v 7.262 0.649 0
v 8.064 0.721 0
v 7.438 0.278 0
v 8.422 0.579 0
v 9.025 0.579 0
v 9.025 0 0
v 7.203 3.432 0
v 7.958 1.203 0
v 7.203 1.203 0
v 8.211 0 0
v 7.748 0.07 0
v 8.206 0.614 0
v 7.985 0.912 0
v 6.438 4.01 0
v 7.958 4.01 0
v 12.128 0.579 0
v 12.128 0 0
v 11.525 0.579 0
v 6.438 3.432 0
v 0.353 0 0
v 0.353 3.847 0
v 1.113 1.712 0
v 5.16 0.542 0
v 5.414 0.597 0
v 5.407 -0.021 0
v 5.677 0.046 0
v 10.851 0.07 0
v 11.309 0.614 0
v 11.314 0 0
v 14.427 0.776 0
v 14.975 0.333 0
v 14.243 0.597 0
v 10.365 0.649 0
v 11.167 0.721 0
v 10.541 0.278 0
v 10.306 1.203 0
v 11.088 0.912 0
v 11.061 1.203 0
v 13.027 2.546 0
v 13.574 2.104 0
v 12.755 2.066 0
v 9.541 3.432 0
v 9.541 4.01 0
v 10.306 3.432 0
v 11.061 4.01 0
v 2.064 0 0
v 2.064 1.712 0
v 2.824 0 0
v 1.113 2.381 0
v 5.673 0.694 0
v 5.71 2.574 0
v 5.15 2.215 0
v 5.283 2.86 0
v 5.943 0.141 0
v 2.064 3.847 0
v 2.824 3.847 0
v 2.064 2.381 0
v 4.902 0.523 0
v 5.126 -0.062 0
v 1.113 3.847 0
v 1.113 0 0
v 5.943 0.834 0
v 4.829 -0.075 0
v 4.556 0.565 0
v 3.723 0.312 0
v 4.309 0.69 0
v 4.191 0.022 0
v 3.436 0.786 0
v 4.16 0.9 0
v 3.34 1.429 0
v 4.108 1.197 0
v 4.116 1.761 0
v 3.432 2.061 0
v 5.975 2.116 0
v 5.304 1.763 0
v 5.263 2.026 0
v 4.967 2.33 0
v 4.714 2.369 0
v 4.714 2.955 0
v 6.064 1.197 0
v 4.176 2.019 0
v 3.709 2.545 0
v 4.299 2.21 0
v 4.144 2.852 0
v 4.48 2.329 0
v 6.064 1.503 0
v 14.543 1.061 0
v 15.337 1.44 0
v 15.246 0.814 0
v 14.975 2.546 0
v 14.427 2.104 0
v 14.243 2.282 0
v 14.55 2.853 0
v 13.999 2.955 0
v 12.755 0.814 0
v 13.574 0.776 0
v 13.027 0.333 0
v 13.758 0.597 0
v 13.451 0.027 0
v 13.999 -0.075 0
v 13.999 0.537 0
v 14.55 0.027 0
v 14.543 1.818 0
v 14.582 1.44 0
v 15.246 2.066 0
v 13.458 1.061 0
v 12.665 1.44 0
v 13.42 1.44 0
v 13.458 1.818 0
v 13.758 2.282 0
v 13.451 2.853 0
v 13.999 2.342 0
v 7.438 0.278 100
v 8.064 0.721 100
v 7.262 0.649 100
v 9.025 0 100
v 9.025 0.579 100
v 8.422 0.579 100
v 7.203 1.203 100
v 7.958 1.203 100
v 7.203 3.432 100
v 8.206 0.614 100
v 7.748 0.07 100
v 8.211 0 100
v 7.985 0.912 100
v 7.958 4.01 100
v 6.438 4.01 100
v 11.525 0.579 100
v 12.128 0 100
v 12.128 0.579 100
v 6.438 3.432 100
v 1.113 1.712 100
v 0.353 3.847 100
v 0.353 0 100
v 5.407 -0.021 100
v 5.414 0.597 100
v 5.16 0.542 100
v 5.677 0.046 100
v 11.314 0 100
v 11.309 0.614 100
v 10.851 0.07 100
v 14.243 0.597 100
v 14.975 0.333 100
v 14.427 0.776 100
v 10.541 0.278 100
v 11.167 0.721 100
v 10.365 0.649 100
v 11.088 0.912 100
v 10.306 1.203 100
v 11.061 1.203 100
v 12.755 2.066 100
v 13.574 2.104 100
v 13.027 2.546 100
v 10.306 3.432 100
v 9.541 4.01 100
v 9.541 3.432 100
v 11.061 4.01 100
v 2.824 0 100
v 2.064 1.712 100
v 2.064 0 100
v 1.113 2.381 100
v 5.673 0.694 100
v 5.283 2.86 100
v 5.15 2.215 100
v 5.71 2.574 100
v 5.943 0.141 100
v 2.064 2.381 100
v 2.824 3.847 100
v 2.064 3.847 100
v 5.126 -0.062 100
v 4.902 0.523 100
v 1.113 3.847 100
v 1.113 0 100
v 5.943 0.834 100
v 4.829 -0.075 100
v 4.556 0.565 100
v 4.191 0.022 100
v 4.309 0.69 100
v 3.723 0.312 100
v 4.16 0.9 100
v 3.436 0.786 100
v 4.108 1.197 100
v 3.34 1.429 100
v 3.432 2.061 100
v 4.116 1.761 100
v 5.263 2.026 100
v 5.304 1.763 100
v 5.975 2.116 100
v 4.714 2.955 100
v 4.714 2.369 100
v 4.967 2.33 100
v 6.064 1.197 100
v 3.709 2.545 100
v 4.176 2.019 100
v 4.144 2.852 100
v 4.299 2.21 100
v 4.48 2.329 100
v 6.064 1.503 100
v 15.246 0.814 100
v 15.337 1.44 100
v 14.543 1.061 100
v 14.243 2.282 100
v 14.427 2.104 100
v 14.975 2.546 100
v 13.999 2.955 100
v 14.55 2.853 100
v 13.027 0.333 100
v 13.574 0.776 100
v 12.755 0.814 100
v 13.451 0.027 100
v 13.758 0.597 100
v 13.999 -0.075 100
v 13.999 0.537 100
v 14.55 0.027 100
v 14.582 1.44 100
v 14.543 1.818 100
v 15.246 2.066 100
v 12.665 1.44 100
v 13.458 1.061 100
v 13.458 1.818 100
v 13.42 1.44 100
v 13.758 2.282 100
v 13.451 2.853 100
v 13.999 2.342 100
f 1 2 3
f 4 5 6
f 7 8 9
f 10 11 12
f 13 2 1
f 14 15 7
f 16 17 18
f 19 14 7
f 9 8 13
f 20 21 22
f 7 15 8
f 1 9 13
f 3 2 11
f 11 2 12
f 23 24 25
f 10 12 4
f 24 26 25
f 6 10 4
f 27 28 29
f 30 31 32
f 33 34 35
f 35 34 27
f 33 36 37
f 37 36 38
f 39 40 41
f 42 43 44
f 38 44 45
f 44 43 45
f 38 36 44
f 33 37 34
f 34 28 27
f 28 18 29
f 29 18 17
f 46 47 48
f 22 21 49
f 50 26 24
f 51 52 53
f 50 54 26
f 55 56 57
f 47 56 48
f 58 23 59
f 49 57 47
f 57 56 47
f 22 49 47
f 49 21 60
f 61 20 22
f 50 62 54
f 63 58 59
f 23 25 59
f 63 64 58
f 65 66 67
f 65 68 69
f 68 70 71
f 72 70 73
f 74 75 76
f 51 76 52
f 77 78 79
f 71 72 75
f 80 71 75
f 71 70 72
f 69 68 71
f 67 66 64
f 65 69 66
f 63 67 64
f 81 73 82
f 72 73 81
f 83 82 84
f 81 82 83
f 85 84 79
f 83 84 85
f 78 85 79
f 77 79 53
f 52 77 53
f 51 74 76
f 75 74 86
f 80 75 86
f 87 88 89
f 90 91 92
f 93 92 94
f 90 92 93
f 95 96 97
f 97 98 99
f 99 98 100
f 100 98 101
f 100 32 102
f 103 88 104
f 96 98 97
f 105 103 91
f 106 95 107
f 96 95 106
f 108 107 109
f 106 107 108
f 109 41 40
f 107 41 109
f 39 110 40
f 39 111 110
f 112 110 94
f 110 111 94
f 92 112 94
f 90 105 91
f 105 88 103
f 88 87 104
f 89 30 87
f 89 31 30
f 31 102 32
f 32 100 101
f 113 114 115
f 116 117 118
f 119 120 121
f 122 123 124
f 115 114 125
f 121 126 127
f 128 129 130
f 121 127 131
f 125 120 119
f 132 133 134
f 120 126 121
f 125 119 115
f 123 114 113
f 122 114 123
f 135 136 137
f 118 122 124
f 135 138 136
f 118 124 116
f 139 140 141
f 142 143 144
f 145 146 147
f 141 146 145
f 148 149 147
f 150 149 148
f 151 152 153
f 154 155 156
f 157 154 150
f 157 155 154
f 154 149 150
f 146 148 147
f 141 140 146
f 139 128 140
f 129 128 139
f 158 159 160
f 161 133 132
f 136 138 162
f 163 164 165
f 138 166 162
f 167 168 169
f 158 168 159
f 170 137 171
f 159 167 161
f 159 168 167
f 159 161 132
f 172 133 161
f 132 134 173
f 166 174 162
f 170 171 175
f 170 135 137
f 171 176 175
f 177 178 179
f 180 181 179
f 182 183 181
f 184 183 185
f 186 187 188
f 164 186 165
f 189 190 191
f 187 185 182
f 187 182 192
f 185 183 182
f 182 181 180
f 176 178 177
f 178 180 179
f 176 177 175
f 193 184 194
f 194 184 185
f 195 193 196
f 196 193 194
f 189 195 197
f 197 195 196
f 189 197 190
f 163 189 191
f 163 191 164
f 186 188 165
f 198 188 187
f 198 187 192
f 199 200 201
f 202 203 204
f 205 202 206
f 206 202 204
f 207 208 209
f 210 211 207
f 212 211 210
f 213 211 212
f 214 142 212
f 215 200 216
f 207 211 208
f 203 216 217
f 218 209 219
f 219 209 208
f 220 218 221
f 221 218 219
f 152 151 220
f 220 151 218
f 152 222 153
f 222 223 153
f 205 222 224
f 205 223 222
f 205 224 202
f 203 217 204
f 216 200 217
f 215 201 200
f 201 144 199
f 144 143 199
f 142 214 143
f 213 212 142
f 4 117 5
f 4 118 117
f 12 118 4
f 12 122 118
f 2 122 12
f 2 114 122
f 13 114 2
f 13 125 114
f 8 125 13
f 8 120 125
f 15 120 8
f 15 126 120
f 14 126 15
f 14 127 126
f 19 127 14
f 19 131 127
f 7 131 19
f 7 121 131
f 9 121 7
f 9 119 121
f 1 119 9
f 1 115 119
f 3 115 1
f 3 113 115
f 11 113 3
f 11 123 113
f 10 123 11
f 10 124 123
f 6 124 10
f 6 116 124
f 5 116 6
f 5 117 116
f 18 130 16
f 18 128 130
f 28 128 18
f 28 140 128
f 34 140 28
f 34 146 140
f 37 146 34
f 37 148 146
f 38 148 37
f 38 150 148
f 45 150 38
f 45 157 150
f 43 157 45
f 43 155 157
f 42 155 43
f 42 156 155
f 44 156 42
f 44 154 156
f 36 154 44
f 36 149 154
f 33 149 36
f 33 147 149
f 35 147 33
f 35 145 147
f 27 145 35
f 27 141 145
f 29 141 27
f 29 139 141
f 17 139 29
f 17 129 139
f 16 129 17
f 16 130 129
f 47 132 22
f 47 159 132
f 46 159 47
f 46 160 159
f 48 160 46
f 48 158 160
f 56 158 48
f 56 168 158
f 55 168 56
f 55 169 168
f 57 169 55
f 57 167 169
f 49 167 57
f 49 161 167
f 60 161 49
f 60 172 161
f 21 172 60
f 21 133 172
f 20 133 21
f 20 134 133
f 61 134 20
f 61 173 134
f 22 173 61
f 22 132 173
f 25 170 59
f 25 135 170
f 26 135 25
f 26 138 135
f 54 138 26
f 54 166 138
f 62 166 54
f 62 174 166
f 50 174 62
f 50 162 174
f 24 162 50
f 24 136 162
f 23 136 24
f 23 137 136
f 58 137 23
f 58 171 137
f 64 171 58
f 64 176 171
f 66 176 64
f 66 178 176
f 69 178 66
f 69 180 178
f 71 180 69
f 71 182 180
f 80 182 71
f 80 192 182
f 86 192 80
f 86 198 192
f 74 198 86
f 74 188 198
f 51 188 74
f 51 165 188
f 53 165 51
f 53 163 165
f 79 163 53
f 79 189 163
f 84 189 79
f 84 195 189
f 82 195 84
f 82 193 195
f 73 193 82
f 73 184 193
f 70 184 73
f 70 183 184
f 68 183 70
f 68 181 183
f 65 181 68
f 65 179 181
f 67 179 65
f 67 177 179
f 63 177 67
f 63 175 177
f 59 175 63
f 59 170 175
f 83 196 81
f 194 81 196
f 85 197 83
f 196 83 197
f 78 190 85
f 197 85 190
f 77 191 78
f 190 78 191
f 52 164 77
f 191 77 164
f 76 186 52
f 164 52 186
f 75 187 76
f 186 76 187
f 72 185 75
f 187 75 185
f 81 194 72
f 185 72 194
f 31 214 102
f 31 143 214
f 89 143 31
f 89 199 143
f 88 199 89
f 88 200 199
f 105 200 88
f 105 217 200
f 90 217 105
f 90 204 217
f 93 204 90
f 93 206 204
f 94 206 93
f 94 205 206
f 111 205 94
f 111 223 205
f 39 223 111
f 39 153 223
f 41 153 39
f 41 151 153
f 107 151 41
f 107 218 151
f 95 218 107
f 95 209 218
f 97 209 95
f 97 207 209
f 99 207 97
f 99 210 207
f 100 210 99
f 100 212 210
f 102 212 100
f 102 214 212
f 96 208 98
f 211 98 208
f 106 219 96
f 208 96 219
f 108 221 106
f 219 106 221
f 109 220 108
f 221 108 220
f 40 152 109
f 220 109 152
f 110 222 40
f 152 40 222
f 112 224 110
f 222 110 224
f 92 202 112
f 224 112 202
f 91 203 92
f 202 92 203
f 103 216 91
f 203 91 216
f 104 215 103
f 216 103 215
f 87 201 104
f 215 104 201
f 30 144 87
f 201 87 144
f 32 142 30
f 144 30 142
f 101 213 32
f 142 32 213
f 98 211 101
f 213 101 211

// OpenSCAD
linear_extrude() {
  text(
    text = "Hello",
    font="DejaVu Sans Mono:style=Bold",
    size=3.8
  );
}
